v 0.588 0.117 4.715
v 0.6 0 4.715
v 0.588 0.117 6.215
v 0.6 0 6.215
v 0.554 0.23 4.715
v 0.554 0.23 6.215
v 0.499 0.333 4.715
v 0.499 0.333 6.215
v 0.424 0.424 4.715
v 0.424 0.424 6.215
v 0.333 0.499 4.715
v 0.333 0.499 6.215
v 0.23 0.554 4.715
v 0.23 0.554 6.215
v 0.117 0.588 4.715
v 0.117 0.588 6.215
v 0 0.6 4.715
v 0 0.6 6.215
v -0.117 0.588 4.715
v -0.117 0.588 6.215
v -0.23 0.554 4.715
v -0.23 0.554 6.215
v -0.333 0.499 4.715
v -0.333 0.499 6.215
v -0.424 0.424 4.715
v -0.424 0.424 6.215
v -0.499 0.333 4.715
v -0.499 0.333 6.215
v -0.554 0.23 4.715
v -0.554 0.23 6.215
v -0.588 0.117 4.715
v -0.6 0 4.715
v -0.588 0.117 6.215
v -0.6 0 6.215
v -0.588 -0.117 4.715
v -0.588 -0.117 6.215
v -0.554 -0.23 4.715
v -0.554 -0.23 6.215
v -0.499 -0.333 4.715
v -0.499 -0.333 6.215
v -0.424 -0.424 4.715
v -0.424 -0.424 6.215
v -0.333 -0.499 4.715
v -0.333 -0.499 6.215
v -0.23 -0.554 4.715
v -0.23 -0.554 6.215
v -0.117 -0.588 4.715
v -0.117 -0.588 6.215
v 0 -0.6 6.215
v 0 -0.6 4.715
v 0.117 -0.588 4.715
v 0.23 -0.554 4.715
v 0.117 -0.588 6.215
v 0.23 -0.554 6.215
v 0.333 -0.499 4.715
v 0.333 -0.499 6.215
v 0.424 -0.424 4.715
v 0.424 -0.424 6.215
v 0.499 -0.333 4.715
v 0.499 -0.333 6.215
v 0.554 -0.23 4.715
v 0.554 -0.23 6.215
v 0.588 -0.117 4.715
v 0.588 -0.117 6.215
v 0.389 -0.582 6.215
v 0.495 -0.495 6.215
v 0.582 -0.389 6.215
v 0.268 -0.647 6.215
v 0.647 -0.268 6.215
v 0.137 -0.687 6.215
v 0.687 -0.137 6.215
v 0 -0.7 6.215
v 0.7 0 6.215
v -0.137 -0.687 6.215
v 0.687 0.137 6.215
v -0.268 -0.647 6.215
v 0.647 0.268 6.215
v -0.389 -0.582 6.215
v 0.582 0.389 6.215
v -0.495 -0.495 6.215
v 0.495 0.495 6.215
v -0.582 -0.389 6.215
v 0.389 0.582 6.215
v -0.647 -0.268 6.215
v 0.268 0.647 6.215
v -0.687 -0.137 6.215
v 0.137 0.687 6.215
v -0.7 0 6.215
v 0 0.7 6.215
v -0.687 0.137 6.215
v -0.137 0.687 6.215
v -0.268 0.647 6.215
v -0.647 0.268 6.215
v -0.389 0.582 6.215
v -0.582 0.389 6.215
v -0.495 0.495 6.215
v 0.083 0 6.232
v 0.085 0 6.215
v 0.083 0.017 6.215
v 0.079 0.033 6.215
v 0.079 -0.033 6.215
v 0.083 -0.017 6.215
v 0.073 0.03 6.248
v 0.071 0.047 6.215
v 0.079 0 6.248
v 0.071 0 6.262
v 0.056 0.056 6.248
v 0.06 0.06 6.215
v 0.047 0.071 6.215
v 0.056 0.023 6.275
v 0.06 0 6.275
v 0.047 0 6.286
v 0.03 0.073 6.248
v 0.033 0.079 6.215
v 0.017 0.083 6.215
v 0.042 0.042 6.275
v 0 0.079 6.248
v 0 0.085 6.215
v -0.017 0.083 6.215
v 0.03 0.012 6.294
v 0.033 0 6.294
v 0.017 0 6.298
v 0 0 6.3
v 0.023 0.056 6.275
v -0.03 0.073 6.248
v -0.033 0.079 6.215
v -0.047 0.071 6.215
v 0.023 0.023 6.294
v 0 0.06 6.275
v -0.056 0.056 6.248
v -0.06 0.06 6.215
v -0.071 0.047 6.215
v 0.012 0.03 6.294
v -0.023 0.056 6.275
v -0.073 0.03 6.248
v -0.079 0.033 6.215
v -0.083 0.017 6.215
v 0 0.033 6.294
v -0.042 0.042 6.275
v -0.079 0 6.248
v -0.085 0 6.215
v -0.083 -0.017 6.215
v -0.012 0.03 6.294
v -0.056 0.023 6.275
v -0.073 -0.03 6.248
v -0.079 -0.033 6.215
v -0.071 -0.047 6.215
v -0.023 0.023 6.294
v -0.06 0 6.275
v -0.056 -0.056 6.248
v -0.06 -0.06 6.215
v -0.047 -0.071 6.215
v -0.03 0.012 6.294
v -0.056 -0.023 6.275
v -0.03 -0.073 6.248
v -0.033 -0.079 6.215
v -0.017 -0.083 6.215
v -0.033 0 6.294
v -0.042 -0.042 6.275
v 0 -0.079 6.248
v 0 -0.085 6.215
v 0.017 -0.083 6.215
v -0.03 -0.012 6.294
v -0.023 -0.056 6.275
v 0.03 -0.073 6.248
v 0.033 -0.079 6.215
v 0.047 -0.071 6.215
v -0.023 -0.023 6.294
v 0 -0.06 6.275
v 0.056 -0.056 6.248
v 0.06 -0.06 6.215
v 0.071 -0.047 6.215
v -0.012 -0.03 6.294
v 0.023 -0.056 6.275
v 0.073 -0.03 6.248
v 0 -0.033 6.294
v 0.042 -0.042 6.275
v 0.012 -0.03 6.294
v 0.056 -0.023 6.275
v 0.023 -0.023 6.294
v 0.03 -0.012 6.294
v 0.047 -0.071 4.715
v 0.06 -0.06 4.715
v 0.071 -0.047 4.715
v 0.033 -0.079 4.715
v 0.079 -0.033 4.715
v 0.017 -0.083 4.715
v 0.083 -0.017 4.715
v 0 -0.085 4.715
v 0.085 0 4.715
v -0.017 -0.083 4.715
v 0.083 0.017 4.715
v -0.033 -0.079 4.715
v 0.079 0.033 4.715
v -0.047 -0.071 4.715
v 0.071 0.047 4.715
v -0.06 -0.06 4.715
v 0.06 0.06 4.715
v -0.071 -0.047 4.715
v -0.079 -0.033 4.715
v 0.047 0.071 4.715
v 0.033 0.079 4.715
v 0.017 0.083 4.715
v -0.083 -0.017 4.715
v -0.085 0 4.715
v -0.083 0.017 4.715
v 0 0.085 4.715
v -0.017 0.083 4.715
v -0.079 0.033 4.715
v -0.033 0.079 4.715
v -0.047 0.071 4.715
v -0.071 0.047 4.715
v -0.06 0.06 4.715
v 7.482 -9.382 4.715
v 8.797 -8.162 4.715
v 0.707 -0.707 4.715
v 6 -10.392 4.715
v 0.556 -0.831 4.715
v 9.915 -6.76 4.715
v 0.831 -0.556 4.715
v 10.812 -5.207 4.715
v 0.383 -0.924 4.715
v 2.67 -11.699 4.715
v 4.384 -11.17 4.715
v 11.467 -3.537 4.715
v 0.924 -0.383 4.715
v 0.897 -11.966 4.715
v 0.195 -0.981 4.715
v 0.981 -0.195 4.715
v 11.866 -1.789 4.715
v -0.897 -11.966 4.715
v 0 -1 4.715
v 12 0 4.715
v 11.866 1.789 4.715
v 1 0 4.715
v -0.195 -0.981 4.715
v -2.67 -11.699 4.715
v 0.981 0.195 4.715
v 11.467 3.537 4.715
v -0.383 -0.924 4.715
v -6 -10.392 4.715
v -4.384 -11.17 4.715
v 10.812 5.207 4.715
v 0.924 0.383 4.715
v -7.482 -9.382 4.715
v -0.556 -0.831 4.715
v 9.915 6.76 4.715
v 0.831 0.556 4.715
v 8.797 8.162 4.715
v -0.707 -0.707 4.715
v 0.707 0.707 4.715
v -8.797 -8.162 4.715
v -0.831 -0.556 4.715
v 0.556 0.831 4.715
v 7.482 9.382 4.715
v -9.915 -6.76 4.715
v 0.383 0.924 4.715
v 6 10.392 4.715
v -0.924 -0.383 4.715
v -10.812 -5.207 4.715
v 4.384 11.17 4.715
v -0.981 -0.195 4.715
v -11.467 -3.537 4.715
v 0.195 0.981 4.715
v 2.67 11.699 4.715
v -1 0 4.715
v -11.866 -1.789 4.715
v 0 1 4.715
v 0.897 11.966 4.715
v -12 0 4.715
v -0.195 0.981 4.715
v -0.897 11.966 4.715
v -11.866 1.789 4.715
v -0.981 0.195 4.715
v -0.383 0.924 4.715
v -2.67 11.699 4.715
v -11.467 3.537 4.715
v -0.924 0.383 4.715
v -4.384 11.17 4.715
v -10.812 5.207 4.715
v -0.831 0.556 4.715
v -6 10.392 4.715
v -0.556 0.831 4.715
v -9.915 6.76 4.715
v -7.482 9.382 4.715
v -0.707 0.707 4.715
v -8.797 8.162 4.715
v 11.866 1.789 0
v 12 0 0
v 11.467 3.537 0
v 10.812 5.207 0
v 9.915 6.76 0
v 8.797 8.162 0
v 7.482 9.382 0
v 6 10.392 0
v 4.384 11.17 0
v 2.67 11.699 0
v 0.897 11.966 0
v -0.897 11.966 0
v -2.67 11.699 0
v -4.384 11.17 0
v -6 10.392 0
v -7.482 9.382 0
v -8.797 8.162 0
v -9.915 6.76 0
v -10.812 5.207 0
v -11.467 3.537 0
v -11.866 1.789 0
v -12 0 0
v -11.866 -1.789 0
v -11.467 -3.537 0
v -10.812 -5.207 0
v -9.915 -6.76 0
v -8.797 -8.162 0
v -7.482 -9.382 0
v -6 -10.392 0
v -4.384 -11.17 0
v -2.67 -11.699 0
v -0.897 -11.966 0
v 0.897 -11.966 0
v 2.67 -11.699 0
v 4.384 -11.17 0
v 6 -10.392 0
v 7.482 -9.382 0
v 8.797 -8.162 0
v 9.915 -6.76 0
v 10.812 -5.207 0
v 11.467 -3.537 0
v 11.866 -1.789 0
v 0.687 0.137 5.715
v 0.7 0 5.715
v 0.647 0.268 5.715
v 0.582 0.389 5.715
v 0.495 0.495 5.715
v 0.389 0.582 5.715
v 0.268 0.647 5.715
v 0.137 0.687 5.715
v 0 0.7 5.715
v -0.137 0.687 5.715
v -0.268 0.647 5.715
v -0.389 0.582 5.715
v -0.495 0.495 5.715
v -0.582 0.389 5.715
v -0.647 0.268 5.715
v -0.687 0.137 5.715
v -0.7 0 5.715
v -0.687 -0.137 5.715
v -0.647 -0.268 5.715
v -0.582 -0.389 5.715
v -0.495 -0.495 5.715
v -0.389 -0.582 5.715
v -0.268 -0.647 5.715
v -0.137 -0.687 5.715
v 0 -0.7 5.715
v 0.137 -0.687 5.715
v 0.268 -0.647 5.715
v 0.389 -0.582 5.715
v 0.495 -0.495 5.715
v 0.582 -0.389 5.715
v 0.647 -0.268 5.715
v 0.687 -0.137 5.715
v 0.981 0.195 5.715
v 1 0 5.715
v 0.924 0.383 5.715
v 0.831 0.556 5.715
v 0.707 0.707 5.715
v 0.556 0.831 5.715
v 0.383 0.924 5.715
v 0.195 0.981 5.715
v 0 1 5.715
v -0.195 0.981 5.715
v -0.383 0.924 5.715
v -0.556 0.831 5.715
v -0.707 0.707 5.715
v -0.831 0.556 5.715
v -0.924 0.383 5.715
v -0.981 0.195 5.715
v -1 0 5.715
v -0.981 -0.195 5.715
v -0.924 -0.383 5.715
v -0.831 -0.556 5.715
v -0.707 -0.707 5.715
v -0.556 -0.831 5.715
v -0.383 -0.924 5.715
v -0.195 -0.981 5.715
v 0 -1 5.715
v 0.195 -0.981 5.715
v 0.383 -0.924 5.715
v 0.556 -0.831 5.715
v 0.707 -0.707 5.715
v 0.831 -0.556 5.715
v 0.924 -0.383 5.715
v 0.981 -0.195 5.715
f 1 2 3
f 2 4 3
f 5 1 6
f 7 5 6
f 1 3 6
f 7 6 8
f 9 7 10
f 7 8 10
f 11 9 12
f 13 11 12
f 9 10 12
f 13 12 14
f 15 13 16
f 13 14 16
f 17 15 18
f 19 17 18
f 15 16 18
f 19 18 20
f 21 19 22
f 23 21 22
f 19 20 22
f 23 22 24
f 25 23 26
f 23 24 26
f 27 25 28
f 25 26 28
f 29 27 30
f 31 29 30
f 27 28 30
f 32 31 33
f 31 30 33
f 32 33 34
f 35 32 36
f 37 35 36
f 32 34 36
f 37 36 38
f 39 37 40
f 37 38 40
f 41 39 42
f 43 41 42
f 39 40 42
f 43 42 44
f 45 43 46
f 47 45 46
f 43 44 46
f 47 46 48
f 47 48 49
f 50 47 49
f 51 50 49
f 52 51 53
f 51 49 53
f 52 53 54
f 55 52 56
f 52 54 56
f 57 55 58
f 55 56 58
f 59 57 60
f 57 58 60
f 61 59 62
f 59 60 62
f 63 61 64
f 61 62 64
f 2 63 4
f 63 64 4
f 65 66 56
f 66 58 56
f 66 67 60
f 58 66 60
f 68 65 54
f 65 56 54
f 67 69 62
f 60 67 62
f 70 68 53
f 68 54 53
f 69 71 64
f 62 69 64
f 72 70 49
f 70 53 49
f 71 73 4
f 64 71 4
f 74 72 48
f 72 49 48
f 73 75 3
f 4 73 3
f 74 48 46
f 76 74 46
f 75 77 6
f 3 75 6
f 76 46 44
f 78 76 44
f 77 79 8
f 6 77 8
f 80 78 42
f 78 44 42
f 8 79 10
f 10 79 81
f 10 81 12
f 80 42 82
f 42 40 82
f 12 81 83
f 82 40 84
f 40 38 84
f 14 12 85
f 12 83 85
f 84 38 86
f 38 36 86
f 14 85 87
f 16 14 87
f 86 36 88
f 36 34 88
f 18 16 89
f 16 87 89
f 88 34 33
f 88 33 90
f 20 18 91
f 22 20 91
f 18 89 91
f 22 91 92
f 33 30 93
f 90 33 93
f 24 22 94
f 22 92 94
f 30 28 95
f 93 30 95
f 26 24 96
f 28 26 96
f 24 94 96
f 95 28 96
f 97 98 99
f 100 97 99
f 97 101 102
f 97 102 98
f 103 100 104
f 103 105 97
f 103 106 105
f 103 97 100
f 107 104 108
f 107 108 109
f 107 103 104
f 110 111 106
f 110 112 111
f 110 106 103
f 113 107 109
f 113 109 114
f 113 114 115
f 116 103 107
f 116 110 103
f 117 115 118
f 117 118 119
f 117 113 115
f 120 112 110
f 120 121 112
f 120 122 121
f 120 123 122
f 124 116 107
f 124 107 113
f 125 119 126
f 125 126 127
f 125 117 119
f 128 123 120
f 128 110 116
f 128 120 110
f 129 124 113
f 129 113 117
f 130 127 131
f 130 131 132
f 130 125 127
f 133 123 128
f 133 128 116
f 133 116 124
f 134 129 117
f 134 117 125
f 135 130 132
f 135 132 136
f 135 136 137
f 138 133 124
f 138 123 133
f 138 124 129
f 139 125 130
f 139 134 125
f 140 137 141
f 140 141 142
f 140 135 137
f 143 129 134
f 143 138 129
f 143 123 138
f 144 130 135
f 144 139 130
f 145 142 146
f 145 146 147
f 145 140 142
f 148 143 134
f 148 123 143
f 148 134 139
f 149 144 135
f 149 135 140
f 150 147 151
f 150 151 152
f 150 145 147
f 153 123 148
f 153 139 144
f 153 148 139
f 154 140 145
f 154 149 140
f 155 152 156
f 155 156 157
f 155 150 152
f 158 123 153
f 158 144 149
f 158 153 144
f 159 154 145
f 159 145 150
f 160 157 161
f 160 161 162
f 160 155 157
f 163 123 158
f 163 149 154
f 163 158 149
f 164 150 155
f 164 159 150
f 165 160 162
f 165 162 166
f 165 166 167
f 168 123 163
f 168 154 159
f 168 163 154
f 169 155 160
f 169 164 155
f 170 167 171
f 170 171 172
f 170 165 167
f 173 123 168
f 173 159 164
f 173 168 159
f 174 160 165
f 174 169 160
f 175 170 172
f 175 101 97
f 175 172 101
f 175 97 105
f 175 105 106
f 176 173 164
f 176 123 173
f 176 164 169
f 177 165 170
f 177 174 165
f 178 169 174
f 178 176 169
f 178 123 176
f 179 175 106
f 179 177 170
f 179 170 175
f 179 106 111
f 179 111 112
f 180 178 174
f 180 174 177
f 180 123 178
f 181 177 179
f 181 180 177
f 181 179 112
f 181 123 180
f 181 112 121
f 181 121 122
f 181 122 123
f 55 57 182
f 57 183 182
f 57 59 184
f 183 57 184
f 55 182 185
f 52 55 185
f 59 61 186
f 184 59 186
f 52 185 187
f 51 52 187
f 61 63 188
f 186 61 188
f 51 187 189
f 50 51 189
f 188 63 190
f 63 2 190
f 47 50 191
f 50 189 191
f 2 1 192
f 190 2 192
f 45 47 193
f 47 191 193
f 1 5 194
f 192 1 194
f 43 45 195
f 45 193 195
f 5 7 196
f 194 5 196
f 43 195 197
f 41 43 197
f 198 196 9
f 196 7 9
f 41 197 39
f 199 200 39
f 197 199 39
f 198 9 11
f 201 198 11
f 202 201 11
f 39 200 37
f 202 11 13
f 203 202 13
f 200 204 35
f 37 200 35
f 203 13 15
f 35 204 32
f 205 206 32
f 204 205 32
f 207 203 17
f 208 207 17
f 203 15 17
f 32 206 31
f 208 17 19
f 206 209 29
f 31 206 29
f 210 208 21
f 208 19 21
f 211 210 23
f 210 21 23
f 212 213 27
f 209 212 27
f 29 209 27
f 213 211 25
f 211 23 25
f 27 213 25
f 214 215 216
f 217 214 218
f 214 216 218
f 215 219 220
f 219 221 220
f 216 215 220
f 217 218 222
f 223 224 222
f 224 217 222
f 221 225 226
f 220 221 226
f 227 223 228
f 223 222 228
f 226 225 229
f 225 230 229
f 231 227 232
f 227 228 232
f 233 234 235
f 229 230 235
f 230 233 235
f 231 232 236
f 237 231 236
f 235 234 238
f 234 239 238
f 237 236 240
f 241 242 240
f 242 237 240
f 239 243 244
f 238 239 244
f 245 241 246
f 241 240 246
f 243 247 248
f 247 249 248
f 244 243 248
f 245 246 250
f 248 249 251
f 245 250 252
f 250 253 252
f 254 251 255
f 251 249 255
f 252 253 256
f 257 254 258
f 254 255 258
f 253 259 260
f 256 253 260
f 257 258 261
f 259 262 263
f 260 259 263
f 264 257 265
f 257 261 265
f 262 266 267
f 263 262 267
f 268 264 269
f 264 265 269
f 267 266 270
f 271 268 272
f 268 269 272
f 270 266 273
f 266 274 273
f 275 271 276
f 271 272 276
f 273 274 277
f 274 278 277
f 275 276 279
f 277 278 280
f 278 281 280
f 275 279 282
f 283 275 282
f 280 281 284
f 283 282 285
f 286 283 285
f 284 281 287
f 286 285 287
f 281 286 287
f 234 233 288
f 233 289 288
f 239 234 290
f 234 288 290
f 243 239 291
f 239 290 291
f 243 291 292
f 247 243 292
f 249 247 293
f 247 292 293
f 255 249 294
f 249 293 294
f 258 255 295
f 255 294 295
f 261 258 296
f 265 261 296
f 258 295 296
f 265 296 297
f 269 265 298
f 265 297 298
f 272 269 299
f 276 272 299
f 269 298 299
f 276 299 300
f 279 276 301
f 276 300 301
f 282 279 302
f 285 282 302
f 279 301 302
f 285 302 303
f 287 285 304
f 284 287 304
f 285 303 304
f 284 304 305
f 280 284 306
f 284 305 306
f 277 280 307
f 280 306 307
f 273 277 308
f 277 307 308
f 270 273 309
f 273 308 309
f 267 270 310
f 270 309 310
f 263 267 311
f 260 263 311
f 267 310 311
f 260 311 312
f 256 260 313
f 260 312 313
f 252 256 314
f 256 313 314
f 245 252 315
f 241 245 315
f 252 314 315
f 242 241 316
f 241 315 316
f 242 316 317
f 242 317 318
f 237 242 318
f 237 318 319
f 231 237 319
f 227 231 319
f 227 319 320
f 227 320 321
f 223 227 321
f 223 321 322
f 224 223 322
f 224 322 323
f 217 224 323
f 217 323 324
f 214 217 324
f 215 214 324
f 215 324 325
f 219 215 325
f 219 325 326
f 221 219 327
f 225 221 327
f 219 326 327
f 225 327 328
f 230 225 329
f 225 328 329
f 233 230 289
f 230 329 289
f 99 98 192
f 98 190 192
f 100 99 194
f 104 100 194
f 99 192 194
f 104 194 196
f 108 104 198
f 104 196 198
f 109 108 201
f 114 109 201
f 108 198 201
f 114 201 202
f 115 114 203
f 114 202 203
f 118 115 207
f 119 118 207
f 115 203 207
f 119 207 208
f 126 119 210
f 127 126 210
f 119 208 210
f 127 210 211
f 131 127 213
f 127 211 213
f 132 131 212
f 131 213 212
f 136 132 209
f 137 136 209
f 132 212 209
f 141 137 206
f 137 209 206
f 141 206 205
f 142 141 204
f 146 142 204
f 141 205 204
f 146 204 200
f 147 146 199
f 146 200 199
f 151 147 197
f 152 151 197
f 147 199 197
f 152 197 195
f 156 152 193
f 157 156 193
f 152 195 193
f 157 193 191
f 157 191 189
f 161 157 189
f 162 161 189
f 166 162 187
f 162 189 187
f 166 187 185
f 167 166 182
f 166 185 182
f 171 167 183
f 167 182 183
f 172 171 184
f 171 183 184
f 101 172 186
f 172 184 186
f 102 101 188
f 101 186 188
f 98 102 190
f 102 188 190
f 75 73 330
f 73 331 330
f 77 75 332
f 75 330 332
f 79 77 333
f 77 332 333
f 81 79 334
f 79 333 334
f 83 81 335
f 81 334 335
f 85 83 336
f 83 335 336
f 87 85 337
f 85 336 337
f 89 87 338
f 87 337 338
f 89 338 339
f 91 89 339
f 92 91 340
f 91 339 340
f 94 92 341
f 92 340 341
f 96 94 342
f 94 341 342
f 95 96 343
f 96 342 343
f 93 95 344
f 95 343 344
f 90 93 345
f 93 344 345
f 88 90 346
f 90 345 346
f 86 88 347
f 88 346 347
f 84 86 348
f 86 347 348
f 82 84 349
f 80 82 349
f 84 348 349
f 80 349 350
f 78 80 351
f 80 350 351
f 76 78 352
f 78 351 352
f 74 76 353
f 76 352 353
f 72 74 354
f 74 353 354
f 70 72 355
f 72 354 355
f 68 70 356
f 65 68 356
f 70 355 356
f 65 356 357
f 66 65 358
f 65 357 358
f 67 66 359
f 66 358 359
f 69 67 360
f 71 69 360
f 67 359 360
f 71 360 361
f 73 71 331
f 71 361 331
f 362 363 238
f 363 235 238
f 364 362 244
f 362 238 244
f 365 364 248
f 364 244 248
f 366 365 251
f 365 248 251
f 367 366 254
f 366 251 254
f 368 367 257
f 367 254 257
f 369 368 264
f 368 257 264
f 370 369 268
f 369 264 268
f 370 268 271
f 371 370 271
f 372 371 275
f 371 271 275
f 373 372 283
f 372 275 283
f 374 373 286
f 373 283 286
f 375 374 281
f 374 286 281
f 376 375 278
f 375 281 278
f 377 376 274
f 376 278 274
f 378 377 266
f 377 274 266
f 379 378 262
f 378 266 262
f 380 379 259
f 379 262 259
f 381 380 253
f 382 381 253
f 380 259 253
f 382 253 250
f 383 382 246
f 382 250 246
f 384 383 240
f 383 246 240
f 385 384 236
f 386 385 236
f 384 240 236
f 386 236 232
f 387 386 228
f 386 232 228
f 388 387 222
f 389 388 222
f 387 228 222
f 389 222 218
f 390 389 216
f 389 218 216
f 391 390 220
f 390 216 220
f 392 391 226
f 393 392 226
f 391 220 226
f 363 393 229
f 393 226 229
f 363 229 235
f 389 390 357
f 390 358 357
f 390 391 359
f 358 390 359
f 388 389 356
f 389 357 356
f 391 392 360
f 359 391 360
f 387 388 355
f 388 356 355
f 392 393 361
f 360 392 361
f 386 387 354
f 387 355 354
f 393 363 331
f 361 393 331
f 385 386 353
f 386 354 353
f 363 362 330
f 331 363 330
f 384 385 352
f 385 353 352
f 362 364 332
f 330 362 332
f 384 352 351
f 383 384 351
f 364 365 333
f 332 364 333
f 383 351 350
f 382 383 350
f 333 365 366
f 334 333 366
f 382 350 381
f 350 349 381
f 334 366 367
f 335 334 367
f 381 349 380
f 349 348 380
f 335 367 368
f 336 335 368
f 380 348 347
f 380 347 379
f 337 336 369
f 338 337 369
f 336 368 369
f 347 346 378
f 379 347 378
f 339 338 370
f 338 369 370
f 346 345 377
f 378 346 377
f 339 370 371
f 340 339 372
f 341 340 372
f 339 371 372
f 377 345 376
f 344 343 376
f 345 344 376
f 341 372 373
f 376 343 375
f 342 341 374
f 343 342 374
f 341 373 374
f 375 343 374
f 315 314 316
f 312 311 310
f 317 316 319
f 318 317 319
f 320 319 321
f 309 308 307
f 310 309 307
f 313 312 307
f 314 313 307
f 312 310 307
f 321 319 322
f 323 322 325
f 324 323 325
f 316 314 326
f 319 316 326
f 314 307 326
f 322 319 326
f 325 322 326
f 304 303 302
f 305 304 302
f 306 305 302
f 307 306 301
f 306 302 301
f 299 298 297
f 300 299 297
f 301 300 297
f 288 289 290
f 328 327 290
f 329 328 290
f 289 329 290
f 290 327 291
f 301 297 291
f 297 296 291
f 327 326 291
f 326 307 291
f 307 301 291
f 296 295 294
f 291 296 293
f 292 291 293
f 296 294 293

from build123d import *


with BuildPart() as part:
    # Sketch → Revolution (revolve)
    with BuildSketch(Plane.XZ):
        with BuildLine():
            Line((0.085, 6.215), (0.085, 4.715))
            Line((0.085, 4.715), (0.6, 4.715))
            Line((0.6, 4.715), (0.6, 6.215))
            Line((0.6, 6.215), (0.7, 6.215))
            Line((0.7, 6.215), (0.7, 5.715))
            Line((0.7, 5.715), (1, 5.715))
            Line((1, 5.715), (1, 4.715))
            Line((1, 4.715), (12, 4.715))
            Line((12, 4.715), (12, 0))
            Line((12, 0), (0, 0))
            Line((0, 0), (0, 6.3))
            ThreePointArc((0.085, 6.215), (0.060104, 6.275104), (0, 6.3))
        make_face()
    revolve(axis=Axis((0, 0, 0), (0, 0, 1)))


solid = part.part
